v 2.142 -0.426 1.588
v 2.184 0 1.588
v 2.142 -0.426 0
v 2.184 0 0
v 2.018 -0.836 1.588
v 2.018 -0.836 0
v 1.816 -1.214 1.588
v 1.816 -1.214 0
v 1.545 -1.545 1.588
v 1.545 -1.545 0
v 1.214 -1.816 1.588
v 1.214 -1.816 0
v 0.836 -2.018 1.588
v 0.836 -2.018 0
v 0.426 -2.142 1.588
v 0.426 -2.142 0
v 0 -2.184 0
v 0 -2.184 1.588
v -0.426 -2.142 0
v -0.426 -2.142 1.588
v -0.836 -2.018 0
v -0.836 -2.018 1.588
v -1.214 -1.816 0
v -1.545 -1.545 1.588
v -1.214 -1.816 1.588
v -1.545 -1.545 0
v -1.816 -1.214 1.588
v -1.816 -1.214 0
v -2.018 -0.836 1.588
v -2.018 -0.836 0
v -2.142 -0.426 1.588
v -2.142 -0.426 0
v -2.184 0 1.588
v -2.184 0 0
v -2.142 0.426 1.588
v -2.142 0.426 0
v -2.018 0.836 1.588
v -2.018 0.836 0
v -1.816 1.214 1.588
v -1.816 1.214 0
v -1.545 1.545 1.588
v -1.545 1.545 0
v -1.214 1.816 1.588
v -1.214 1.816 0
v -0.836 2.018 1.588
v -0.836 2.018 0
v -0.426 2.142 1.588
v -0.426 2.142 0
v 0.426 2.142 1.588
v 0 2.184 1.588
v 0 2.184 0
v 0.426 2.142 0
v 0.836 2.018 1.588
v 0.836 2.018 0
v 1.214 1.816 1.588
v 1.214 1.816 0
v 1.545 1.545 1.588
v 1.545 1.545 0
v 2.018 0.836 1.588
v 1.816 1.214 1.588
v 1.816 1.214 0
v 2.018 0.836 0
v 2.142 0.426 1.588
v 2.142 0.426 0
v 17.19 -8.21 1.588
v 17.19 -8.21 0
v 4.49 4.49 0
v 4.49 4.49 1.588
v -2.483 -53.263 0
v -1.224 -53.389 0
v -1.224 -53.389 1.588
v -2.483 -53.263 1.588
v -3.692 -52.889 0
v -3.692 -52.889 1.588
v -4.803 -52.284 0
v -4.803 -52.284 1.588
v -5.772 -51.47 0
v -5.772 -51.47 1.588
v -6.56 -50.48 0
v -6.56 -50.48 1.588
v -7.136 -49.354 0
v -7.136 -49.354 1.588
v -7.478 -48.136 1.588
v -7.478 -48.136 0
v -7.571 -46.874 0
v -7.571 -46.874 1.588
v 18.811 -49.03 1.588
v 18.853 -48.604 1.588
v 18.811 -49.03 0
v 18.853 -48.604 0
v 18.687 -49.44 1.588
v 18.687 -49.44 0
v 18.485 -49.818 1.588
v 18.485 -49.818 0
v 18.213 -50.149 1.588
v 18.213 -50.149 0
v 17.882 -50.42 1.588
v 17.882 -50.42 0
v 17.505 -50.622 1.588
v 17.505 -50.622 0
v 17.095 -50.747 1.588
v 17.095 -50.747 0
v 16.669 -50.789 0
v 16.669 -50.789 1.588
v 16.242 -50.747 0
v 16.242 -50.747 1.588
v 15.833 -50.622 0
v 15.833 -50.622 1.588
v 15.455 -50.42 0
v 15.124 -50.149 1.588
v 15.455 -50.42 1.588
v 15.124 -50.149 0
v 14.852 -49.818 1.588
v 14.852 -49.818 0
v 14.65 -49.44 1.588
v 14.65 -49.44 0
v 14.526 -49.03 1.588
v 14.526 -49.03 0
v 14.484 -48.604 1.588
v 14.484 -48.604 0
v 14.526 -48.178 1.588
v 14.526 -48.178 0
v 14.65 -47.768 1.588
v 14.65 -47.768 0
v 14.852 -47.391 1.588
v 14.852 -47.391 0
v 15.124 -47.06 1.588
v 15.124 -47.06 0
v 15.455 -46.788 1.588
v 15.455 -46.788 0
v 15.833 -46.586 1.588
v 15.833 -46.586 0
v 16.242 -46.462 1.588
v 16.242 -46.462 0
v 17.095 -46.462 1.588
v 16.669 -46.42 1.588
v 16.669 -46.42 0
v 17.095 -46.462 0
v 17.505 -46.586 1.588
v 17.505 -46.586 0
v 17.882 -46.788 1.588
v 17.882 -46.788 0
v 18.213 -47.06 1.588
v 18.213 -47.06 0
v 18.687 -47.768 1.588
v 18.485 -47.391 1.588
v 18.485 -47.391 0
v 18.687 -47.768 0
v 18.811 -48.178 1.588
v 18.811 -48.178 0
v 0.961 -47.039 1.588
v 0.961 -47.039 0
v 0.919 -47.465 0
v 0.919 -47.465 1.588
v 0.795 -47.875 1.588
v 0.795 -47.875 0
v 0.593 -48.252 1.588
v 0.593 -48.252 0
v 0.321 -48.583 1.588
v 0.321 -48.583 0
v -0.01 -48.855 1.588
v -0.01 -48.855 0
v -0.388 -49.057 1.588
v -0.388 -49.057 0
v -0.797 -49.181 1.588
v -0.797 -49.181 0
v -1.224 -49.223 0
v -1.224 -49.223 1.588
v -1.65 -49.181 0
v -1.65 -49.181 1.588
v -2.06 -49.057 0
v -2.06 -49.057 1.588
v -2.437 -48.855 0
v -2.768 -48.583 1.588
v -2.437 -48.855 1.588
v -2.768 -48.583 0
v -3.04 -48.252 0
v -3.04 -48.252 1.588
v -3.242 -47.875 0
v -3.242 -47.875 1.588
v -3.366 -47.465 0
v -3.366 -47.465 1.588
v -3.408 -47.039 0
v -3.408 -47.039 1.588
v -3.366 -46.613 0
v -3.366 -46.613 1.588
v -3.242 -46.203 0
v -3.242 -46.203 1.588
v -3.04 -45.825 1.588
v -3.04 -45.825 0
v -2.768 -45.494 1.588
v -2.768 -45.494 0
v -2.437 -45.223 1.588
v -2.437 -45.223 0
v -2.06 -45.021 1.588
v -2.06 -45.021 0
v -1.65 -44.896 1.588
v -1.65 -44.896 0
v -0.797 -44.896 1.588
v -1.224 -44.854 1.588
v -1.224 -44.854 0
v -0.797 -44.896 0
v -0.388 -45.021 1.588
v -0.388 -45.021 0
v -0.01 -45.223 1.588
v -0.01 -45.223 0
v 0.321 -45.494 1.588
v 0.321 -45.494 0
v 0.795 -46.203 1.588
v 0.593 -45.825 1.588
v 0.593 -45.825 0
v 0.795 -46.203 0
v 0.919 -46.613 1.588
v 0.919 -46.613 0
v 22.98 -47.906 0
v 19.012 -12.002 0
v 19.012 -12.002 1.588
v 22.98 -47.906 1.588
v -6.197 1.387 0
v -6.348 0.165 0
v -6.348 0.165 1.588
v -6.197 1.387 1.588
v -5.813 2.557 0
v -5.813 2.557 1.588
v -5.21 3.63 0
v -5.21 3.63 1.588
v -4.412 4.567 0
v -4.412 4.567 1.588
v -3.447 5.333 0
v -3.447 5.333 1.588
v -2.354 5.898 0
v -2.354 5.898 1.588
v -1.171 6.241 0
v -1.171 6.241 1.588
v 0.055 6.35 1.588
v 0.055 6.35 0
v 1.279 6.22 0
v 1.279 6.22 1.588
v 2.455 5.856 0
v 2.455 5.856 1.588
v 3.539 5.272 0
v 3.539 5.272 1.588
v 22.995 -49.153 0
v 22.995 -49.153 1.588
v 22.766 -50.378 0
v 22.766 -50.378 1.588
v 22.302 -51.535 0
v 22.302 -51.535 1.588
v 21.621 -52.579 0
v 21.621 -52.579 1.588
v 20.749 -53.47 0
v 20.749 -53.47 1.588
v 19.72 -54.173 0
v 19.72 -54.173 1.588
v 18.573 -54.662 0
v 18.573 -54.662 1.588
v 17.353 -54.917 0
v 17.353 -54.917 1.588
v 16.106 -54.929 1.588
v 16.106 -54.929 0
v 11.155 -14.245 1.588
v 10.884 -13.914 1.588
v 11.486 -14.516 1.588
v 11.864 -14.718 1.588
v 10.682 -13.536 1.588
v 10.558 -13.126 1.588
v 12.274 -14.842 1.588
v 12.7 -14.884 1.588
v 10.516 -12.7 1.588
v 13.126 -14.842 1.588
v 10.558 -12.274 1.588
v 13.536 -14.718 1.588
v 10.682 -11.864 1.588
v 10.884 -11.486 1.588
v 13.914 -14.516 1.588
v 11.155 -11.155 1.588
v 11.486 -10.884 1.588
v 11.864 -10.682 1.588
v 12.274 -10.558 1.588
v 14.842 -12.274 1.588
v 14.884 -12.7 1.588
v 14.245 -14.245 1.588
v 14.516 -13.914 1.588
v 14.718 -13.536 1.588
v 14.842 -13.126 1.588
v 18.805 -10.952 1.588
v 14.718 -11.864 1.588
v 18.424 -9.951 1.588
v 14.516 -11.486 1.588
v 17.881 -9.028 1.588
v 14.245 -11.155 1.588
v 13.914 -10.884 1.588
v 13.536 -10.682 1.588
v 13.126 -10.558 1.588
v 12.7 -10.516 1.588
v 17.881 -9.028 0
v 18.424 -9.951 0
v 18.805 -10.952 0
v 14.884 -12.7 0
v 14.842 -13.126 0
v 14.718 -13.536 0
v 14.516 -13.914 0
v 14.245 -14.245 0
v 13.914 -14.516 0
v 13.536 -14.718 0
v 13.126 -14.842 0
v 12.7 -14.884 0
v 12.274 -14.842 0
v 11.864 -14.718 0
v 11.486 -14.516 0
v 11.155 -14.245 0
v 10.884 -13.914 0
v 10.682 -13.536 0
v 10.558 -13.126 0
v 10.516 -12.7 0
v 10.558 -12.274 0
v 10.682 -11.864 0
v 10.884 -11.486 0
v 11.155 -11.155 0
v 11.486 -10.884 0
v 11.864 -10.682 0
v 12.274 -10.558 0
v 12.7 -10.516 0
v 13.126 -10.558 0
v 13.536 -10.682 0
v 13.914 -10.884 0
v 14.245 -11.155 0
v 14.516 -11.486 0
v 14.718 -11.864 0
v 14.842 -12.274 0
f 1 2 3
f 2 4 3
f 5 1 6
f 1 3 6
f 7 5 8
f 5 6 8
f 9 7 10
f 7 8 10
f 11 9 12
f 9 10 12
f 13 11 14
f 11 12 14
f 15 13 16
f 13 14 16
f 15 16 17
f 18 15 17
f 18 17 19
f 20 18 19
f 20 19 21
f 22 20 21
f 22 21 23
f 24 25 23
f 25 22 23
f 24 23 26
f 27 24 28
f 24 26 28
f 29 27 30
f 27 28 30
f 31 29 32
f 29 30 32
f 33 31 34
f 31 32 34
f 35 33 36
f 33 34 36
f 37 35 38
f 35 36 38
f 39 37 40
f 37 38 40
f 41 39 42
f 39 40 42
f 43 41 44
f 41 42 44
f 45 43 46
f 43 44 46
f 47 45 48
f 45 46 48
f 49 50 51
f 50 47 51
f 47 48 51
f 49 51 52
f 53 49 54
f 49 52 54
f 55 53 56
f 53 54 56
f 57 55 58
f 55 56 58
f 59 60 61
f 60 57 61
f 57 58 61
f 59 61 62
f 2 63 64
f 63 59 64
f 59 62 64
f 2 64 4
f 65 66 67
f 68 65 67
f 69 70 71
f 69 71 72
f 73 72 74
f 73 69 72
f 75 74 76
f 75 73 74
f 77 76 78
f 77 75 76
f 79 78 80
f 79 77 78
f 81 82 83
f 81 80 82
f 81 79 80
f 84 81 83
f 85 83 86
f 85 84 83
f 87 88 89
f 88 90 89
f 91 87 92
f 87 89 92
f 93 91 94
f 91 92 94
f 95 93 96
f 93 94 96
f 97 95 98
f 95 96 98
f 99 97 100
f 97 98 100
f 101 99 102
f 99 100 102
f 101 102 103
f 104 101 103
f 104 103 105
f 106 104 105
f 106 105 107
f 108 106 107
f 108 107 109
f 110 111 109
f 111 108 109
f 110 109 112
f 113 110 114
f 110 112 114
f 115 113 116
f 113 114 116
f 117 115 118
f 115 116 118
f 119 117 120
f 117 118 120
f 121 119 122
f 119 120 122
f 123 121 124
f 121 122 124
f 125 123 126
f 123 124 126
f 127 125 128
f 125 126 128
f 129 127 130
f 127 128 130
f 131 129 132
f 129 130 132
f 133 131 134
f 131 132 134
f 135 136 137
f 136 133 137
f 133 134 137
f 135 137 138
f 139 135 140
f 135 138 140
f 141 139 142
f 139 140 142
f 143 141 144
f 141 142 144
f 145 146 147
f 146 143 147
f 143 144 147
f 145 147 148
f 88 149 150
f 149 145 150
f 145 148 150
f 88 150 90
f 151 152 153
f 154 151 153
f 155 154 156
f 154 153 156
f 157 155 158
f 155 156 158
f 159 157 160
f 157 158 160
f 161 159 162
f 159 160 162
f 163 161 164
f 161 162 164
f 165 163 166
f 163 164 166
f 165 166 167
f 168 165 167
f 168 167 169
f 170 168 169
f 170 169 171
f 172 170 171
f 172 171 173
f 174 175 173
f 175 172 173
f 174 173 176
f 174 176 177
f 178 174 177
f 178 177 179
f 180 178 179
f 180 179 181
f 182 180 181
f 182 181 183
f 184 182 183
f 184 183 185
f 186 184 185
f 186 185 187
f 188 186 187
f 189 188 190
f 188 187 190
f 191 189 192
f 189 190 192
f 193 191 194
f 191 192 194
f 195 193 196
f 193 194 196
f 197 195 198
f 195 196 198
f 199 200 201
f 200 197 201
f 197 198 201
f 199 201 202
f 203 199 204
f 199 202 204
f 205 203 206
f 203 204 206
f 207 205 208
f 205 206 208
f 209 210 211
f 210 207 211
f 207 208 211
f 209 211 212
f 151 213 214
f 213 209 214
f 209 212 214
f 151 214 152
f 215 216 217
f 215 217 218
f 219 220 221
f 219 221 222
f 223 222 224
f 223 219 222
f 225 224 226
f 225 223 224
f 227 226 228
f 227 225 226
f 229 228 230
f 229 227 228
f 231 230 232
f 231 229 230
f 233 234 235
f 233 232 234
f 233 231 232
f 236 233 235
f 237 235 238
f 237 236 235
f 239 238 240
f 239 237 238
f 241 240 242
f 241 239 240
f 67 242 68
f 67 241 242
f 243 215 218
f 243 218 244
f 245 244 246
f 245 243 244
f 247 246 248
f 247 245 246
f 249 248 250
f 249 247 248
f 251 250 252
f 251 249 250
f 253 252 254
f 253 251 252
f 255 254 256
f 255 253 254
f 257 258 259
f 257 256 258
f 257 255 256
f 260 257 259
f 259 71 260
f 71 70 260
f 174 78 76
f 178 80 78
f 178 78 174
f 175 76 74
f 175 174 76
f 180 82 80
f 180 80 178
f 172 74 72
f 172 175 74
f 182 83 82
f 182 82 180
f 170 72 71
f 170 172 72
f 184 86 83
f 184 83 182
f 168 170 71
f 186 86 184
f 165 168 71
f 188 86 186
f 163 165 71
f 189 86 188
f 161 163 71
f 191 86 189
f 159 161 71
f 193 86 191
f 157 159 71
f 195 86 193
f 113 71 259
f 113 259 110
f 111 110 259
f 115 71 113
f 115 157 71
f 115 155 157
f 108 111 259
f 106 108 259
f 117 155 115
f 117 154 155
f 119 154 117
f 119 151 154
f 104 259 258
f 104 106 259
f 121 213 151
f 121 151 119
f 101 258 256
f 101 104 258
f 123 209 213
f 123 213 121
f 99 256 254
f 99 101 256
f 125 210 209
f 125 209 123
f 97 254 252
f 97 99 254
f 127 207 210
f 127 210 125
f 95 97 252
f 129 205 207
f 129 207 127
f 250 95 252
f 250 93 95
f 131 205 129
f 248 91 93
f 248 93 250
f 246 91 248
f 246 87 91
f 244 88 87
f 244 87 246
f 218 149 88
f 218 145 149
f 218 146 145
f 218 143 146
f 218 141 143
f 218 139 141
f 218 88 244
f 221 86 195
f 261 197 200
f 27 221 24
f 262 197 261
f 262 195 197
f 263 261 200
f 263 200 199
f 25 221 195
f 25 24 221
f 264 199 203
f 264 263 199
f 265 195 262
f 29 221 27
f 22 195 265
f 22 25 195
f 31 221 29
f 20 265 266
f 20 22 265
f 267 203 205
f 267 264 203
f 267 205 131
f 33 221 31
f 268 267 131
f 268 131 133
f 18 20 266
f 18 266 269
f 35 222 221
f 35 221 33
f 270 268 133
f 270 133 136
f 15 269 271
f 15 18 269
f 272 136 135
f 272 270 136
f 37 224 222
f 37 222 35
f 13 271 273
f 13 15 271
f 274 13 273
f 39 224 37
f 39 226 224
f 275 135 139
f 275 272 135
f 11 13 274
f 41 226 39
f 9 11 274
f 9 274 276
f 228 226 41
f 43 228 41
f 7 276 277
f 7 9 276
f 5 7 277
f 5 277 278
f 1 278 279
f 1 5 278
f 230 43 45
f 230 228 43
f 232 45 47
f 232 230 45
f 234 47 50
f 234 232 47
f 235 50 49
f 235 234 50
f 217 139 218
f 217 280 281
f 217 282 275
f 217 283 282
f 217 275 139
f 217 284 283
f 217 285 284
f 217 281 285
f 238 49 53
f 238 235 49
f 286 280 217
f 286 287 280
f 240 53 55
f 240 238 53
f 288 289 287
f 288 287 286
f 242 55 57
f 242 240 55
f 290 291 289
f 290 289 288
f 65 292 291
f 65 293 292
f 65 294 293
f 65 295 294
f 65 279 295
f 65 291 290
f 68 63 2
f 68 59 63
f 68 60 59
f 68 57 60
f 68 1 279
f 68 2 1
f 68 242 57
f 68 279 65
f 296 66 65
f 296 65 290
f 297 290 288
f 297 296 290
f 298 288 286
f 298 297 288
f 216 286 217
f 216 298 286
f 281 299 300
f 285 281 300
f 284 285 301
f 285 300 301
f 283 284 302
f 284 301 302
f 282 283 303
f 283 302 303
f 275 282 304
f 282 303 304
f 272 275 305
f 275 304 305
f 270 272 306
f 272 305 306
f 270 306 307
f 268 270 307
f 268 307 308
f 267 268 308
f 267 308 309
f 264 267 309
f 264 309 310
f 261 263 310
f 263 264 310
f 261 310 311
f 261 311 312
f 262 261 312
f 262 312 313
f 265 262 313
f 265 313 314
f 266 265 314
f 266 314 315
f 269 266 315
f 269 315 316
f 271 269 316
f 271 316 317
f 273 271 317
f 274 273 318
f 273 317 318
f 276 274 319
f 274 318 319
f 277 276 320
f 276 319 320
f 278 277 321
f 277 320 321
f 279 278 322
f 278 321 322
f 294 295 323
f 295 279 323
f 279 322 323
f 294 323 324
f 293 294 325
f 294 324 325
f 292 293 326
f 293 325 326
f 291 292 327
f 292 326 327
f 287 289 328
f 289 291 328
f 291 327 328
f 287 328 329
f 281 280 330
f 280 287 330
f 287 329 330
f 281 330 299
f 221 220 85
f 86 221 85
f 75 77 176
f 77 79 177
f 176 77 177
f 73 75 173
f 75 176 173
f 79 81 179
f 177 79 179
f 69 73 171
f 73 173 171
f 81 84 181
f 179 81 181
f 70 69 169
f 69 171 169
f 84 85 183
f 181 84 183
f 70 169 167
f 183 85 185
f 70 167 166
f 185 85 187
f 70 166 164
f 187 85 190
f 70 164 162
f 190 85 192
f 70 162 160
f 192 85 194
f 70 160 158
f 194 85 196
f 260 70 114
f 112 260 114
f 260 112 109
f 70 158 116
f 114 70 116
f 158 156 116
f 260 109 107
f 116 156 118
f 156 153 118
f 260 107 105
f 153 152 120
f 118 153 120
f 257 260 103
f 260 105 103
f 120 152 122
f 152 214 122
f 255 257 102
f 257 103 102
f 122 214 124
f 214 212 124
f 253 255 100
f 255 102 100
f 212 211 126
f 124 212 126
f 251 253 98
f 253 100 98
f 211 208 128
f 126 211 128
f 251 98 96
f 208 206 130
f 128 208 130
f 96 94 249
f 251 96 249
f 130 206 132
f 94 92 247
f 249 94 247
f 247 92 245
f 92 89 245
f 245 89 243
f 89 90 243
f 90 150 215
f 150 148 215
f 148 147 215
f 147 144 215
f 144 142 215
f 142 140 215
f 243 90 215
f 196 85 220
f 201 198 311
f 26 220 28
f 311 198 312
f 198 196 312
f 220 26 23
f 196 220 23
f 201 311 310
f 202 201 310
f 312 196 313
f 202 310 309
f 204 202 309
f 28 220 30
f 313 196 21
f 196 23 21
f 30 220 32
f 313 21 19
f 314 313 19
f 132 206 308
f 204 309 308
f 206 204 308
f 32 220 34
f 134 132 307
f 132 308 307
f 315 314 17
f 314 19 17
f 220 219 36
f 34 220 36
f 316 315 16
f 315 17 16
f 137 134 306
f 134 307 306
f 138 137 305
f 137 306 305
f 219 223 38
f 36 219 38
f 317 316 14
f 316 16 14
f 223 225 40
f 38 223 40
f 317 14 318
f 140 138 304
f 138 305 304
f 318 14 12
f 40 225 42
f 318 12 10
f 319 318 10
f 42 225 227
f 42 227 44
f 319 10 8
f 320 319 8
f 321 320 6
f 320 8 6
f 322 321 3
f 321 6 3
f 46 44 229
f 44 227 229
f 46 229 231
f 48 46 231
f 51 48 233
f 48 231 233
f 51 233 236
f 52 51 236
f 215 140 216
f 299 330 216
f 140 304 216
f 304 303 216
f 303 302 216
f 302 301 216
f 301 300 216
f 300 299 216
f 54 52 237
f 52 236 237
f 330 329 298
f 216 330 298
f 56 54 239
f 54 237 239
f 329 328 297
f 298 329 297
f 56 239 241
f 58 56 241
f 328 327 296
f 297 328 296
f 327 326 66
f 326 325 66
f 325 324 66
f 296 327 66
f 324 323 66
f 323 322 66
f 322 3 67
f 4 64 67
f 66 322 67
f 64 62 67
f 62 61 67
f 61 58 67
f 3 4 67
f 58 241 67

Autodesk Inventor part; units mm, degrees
ref_plane "YZ Plane" through (0, 0, 0) normal (1, 0, 0) x (0, 1, 0)
ref_plane "XZ Plane" through (0, 0, 0) normal (0, 1, 0) x (-1, 0, 0)
ref_plane "XY Plane" through (0, 0, 0) normal (0, 0, 1) x (1, 0, 0)
sketch "main" plane through (0, 0, 0) normal (0, 0, 1) x (1, 0, 0)
  circle A0 centre (-9.3272, -22.4282) radius 2.1844
  circle A1 centre (8.5649, -23.9935) radius 2.1844
  circle A2 centre (4.5963, 11.9106) radius 2.1844
  arc A3 (-15.6751, -22.2631) -> (-9.3272, -28.7782) centre (-9.3272, -22.4282) ccw
  arc A4 (8.0027, -30.3186) -> (14.8765, -23.2959) centre (8.5649, -23.9935) ccw
  arc A5 (10.9079, 12.6083) -> (9.0865, 16.4007) centre (4.5963, 11.9106) ccw
  line L0 (-9.3272, -28.7782) -> (8.0027, -30.3186)
  line L1 (10.9079, 12.6083) -> (14.8765, -23.2959)
  circle A6 centre (-8.1037, 24.6106) radius 2.1844
  arc A7 (-3.6135, 29.1007) -> (-14.4515, 24.7757) centre (-8.1037, 24.6106) ccw
  line L2 (9.0865, 16.4007) -> (-3.6135, 29.1007)
  line L3 (-14.4515, 24.7757) -> (-15.6751, -22.2631)
  point P0 (-0.372, -2.6392)
  dimension "d0" = 12.7
  dimension "d1" = 12.7
  dimension "d2" = 12.7
  dimension "d3" = 12.7
sketch "Sketch1" plane through (0, 0, 0) normal (0, 0, 1) x (1, 0, 0)
  circle A0 centre (-1.2236, -47.0388) radius 2.1844
  circle A1 centre (16.6686, -48.6042) radius 2.1844
  circle A2 centre (12.7, -12.7) radius 2.1844
  arc A3 (-7.5714, -46.8737) -> (-1.2236, -53.3888) centre (-1.2236, -47.0388) ccw
  arc A4 (16.1064, -54.9292) -> (22.9802, -47.9065) centre (16.6686, -48.6042) ccw
  arc A5 (19.0116, -12.0024) -> (17.1901, -8.2099) centre (12.7, -12.7) ccw
  line L0 (-1.2236, -53.3888) -> (16.1064, -54.9292)
  line L1 (19.0116, -12.0024) -> (22.9802, -47.9065)
  circle A6 centre (0, 0) radius 2.1844
  arc A7 (4.4901, 4.4901) -> (-6.3479, 0.1651) centre (0, 0) ccw
  line L2 (17.1901, -8.2099) -> (4.4901, 4.4901)
  line L3 (-6.3479, 0.1651) -> (-7.5714, -46.8737)
extrude "Extrusion1" add sketch "Sketch1" along normal blind 1.5875
properties part number "floating-stage-bracket" material "Acetal Resin, Black"
